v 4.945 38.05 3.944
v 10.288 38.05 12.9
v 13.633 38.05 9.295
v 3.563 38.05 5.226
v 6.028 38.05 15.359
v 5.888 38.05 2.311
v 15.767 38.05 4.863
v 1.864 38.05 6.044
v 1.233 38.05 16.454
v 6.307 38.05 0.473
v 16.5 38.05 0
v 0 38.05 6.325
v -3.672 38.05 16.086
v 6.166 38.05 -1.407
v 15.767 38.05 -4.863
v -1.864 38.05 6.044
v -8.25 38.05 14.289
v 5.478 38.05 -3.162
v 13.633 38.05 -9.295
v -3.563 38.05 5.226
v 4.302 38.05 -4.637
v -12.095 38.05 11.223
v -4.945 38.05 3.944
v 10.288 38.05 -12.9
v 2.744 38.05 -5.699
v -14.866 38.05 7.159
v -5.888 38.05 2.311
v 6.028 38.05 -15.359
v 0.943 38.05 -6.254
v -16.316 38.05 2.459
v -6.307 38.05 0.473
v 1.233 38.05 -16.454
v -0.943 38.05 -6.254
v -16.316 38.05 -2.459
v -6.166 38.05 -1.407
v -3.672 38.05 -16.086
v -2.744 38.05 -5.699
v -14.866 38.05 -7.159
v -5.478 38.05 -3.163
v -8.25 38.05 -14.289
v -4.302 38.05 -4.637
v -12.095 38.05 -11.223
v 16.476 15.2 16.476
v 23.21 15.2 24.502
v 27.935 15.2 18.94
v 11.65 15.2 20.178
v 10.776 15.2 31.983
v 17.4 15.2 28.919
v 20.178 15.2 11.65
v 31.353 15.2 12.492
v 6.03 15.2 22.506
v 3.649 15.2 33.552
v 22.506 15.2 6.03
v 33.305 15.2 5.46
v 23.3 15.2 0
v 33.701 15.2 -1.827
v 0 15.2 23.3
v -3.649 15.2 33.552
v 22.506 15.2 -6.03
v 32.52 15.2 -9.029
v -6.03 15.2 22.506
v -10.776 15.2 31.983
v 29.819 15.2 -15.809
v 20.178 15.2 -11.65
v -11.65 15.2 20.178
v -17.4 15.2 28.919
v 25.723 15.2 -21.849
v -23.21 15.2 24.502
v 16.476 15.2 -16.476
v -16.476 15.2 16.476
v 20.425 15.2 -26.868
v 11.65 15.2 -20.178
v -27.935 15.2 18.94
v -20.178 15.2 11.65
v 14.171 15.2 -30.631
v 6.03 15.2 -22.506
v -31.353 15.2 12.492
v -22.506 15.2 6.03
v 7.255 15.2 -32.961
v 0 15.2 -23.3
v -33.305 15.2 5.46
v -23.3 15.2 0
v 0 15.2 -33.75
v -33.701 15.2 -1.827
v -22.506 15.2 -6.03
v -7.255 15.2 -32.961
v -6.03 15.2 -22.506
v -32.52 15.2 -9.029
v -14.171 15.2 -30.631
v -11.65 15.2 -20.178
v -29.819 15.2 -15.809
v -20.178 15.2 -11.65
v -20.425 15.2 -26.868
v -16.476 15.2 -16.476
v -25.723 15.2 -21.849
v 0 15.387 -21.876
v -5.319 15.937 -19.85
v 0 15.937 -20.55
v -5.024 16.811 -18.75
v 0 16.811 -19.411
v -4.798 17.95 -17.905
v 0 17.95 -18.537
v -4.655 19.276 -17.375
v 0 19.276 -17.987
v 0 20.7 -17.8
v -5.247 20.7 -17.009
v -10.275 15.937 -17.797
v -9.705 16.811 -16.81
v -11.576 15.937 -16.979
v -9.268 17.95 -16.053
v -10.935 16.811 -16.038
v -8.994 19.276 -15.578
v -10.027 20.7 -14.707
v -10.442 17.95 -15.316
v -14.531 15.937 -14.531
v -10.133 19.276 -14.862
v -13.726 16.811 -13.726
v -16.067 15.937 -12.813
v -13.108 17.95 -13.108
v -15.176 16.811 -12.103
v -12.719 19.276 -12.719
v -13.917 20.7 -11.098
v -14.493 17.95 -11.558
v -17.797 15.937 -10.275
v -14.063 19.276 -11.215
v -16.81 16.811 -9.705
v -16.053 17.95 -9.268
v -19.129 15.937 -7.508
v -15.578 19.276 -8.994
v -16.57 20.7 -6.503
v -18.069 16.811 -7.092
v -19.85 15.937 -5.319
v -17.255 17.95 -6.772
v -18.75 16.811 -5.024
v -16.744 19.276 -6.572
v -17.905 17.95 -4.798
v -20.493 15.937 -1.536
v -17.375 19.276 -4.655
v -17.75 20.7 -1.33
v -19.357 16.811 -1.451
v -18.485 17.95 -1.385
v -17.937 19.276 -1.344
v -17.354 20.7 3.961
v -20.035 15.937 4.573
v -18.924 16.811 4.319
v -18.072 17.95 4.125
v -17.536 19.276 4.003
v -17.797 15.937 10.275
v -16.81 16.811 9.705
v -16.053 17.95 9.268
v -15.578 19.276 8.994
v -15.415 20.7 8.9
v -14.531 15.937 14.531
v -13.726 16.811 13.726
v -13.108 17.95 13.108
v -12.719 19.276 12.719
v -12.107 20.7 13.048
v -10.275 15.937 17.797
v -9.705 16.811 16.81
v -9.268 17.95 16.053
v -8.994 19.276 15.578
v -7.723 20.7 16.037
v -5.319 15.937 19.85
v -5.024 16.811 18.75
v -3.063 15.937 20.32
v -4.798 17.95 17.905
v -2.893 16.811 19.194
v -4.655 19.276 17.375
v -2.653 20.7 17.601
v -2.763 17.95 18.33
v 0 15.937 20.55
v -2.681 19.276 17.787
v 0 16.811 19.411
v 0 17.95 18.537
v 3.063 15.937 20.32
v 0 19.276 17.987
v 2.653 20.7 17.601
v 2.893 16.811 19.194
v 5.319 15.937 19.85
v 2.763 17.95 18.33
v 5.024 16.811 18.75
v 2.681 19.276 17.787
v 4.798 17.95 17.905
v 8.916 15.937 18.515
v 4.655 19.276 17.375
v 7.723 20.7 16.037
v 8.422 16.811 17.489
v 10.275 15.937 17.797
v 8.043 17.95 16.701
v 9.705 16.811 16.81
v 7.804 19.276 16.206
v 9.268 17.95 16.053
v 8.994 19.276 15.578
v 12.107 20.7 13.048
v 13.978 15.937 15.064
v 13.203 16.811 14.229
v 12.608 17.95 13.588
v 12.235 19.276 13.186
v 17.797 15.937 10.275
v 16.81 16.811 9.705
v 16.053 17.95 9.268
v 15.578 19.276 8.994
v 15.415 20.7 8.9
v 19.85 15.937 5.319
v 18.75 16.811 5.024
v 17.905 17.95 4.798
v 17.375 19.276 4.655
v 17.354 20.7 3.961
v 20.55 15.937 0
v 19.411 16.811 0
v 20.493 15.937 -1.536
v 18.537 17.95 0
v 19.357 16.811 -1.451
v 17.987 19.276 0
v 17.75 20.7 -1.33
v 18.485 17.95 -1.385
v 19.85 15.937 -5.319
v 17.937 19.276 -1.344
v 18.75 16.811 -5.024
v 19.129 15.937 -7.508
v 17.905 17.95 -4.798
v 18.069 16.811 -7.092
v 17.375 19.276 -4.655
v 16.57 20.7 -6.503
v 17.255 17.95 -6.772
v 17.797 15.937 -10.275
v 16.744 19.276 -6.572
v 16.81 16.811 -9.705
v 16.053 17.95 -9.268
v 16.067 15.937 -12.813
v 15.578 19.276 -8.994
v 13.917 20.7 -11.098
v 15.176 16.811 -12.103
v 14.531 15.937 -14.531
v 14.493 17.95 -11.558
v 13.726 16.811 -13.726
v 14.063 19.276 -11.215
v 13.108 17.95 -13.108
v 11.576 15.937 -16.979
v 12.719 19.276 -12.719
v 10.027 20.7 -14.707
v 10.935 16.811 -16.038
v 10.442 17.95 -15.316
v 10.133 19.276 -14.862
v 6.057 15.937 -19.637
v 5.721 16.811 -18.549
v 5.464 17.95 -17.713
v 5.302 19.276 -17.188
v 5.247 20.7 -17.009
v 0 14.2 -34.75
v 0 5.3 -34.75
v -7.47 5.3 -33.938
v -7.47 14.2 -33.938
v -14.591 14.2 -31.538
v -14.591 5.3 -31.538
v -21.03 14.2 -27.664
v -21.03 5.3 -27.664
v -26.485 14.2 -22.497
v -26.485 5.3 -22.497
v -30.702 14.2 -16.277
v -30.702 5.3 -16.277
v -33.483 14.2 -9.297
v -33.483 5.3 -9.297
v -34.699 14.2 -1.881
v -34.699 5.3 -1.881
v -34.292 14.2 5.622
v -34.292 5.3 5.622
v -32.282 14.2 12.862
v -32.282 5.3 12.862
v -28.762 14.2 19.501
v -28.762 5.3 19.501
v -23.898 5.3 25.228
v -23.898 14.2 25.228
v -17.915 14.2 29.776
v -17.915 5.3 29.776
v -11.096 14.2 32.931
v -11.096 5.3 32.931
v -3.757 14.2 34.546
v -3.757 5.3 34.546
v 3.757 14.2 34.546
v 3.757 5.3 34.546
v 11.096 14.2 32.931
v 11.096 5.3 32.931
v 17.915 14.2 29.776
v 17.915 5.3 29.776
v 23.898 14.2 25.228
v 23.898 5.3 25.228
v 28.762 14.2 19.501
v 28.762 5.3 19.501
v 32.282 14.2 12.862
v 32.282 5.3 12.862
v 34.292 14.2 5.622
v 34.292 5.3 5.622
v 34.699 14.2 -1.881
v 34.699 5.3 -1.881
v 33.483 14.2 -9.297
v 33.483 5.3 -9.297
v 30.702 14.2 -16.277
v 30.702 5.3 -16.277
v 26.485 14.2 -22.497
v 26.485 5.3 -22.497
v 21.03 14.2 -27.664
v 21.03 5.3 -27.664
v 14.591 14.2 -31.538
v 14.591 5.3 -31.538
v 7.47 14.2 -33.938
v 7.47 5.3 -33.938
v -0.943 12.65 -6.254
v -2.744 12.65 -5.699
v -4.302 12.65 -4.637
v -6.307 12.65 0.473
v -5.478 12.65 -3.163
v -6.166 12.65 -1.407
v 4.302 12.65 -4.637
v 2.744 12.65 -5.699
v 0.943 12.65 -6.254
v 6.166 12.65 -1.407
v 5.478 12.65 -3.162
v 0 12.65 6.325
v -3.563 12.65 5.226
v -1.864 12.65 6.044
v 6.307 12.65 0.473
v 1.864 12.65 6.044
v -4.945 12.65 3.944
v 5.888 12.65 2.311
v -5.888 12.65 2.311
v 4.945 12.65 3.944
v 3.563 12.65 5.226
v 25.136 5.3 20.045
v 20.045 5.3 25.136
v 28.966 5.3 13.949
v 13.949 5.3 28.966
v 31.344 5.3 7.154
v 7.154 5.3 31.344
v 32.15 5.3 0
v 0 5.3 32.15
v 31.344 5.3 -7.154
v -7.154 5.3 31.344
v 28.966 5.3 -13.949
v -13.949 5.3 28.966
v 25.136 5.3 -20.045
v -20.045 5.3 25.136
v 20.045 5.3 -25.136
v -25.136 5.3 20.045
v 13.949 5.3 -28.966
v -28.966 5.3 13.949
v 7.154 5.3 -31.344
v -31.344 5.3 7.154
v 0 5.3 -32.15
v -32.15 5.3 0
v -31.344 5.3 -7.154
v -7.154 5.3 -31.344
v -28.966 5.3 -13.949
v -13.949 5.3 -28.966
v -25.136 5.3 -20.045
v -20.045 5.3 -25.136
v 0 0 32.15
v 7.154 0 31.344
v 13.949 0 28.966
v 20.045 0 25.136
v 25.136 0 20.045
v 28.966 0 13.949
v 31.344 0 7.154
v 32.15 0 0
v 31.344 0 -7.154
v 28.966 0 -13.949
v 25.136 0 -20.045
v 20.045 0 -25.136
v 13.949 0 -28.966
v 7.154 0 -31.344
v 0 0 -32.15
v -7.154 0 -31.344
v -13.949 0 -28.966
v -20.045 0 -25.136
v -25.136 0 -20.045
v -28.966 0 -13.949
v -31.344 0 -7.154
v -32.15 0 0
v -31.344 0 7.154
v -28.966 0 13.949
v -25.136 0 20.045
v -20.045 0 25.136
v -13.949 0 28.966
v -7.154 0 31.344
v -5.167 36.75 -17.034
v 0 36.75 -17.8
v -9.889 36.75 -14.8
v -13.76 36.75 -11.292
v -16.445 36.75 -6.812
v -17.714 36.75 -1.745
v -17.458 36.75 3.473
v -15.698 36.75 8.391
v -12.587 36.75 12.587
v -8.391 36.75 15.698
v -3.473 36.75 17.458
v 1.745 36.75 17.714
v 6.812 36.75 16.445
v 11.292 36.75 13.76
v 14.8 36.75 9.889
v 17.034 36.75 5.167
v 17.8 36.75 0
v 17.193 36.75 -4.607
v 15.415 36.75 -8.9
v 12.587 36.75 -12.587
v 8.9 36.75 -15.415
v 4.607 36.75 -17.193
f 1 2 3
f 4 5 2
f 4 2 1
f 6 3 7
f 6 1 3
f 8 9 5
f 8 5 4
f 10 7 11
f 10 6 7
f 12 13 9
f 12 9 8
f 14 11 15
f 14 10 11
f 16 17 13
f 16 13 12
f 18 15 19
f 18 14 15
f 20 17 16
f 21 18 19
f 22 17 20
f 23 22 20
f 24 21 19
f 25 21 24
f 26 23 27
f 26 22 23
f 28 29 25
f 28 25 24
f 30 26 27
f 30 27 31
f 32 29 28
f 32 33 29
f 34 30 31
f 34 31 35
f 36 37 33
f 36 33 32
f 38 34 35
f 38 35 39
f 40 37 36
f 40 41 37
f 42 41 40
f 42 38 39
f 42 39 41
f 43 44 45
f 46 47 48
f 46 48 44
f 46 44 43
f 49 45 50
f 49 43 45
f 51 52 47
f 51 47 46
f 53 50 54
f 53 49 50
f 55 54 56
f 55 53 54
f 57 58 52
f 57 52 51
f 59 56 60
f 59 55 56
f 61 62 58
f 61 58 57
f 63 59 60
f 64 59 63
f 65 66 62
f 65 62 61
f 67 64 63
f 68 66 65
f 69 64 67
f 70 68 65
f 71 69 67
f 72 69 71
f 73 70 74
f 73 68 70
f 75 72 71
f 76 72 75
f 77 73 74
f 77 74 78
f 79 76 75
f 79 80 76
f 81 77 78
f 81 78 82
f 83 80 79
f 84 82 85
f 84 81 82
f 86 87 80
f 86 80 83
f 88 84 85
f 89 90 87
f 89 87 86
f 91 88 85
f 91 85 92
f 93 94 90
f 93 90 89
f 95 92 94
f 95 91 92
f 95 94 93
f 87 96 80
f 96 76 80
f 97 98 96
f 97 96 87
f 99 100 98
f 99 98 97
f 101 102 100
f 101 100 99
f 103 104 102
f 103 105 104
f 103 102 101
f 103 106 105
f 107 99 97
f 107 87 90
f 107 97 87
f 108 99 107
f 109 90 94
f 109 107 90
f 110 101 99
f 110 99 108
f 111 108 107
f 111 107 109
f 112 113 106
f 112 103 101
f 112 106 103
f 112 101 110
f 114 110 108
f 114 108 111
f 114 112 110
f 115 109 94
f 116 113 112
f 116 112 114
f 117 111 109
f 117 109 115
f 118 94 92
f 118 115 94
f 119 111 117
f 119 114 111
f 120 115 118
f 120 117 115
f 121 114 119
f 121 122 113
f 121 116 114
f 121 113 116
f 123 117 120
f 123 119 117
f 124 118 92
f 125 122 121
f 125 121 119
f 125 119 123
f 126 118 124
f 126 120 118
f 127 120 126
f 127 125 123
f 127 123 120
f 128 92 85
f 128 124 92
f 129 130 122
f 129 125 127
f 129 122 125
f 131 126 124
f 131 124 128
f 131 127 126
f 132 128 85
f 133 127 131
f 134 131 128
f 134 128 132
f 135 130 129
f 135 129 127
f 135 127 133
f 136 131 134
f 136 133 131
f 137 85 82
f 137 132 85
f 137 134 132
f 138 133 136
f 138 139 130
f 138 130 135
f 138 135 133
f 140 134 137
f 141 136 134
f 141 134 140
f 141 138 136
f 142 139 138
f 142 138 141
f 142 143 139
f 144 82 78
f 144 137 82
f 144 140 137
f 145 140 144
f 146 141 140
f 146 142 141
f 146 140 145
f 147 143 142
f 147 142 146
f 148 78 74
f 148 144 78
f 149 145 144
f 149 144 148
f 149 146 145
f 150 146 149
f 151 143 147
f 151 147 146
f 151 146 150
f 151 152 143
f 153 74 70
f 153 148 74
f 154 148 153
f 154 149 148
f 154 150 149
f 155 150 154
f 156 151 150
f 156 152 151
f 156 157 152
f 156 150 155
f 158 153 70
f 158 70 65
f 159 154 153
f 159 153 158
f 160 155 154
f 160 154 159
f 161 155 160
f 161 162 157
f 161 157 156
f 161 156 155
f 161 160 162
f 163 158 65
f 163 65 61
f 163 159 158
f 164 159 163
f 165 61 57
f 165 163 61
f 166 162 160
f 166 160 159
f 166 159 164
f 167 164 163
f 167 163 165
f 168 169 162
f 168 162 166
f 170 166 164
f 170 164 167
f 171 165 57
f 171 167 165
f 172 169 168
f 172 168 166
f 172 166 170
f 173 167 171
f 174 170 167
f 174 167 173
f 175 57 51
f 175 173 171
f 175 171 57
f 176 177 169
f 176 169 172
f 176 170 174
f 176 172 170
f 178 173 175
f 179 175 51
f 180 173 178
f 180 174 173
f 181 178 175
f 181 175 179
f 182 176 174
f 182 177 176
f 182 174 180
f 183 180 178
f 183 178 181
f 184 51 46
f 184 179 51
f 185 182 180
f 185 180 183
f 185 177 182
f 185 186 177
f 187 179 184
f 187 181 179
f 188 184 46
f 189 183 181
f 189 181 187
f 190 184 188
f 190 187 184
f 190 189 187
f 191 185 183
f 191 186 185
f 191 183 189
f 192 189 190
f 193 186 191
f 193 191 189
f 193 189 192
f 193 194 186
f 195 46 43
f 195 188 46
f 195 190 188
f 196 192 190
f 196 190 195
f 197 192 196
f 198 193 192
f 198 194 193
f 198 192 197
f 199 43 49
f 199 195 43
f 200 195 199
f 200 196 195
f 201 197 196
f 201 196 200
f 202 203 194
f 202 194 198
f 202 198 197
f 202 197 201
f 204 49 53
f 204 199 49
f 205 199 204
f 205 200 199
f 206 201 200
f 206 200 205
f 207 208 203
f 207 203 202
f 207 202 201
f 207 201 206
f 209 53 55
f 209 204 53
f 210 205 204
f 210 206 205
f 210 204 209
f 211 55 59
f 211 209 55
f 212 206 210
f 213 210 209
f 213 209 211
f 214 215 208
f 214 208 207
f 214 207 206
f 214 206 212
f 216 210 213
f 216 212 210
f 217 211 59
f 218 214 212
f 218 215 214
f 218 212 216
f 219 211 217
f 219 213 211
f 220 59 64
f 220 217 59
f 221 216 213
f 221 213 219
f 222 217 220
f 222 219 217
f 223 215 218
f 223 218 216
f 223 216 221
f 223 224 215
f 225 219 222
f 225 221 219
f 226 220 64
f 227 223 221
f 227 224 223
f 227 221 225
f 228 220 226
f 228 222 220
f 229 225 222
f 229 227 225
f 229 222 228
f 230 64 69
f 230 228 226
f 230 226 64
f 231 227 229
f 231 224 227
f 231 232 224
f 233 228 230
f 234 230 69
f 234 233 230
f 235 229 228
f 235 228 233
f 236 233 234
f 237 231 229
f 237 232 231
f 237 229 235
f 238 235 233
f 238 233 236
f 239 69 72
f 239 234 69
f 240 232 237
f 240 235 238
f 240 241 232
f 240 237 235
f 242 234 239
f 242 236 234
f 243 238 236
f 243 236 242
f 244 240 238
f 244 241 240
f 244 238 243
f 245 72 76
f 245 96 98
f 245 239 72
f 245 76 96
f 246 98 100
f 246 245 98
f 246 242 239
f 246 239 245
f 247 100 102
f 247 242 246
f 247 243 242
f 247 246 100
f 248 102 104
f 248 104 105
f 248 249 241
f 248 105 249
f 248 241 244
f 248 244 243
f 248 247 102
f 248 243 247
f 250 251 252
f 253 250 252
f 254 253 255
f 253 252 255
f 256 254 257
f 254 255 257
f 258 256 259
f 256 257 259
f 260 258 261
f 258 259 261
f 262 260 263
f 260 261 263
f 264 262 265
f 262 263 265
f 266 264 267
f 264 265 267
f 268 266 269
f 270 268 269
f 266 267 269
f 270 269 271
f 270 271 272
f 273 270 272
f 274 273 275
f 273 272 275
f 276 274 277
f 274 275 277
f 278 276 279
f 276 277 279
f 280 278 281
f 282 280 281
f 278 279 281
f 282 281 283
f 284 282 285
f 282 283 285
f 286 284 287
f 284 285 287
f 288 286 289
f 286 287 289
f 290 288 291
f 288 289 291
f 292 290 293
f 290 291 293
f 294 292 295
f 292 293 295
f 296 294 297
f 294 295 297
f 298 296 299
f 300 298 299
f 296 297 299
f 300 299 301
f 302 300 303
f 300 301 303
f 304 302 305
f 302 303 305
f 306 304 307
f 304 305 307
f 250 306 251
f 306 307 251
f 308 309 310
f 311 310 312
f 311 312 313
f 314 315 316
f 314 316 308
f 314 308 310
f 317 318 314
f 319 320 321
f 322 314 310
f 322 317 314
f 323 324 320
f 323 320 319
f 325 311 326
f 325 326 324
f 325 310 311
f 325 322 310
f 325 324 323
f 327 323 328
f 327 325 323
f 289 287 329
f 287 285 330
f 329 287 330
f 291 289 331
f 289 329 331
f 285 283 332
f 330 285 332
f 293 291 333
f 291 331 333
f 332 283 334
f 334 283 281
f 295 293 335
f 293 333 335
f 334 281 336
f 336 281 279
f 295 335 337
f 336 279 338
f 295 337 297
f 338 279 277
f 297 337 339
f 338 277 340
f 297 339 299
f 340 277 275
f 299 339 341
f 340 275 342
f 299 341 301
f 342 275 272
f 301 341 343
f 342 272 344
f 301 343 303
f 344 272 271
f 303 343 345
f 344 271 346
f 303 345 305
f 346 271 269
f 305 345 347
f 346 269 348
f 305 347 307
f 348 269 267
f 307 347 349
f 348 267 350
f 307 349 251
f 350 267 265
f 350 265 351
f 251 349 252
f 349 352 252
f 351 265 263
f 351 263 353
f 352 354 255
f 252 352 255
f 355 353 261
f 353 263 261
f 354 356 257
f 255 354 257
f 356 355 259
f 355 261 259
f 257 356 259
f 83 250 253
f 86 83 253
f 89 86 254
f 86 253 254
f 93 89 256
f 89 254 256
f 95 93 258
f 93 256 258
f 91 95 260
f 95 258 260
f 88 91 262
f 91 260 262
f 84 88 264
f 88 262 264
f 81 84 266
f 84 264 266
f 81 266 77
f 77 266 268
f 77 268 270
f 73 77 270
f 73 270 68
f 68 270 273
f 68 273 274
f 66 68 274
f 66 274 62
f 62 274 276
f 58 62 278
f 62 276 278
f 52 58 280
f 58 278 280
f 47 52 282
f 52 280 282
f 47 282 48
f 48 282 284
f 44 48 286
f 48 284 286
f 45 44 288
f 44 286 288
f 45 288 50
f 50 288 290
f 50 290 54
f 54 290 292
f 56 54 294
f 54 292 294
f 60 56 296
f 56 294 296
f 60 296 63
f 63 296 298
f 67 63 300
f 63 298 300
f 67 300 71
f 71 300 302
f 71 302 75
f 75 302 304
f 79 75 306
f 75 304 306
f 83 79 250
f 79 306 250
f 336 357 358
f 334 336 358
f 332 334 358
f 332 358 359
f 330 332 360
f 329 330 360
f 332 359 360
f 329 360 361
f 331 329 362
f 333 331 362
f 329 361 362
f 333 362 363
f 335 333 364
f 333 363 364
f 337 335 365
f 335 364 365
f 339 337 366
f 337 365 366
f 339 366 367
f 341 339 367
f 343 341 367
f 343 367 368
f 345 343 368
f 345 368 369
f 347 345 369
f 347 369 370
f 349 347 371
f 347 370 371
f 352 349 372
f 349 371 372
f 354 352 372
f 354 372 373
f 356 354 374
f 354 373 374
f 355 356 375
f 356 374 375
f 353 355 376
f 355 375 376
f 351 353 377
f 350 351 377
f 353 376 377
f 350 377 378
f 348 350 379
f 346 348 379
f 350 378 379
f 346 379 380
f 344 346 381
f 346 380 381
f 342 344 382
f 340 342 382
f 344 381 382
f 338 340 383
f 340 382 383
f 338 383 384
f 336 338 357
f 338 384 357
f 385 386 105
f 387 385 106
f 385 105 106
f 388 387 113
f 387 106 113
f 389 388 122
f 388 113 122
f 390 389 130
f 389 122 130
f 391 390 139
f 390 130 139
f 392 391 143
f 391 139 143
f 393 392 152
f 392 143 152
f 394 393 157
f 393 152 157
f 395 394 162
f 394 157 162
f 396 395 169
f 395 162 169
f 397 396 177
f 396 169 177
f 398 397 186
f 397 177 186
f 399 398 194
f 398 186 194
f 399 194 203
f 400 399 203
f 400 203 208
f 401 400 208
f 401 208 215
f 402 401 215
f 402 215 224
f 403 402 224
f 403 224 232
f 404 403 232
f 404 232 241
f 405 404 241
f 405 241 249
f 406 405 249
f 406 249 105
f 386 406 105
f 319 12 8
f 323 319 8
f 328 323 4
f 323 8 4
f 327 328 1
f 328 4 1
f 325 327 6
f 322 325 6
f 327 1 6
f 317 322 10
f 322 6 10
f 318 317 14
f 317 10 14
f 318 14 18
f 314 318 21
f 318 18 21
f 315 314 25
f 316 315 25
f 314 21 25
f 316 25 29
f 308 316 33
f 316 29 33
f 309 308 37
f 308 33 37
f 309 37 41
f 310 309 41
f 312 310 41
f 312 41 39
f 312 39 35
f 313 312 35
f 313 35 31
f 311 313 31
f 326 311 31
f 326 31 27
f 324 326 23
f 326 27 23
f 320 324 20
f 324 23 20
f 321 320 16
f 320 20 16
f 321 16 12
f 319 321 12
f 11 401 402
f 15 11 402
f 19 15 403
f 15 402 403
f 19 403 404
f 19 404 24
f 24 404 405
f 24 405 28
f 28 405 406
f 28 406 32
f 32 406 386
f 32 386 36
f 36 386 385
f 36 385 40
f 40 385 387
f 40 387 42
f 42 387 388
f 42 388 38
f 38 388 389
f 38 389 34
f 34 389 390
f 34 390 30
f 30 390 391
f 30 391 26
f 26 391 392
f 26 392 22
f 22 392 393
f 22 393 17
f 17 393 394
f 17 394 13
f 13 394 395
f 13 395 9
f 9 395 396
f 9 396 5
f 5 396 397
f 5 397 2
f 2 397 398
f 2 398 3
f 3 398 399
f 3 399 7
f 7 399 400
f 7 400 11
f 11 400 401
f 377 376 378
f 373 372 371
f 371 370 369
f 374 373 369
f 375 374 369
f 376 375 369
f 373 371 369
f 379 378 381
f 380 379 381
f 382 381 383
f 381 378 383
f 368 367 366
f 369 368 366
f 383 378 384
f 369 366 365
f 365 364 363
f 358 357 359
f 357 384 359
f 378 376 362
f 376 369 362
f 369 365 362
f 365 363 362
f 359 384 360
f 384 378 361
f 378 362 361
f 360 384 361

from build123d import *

# Parameters (mm, degrees)
SKETCH1_R           = 32.15
BOSS_EXTRUDE1_DEPTH = 5.3
SKETCH2_R           = 34.75
BOSS_EXTRUDE2_DEPTH = 9.9
SKETCH3_R           = 17.8
BOSS_EXTRUDE3_DEPTH = 22.85
SKETCH4_R           = 6.325
CUT_EXTRUDE1_DEPTH  = 25.4
FILLET1_R           = 5.5
CHAMFER2_SIZE       = 1


with BuildPart() as part:
    # Sketch1 → Boss-Extrude1 (new body)
    with BuildSketch(Plane(origin=(0, 0, 0), x_dir=(1, 0, 0), z_dir=(0, 1, 0))):
        with Locations(Location((0, 0, 0), (0, 0, 270))):
            Circle(SKETCH1_R)
    extrude(amount=BOSS_EXTRUDE1_DEPTH)

    # Sketch2 → Boss-Extrude2 (add)
    with BuildSketch(Plane(origin=(0, 5.3, 0), x_dir=(1, 0, 0), z_dir=(0, 1, 0))):
        with Locations(Location((0, 0, 0), (0, 0, 90))):
            Circle(SKETCH2_R)
    extrude(amount=BOSS_EXTRUDE2_DEPTH)

    # Sketch3 → Boss-Extrude3 (add)
    with BuildSketch(Plane(origin=(0, 15.2, 0), x_dir=(1, 0, 0), z_dir=(0, 1, 0))):
        with Locations(Location((0, 0, 0), (0, 0, 90))):
            Circle(SKETCH3_R)
    extrude(amount=BOSS_EXTRUDE3_DEPTH)

    # Sketch4 → Cut-Extrude1 (cut)
    with BuildSketch(Plane(origin=(0, 38.05, 0), x_dir=(1, 0, 0), z_dir=(0, 1, 0))):
        with Locations(Location((0, 0, 0), (0, 0, 270))):
            Circle(SKETCH4_R)
    extrude(amount=-CUT_EXTRUDE1_DEPTH, mode=Mode.SUBTRACT)

    # Fillet1
    fillet1_edges = [part.edges().sort_by_distance(p)[0] for p in [
        (0, 15.2, 17.8),
    ]]
    fillet(fillet1_edges, radius=FILLET1_R)

    # Chamfer1: read off the stored shape, not the designer's step
    # Chamfer1 outline → Chamfer1 (revolve, cut)
    with BuildSketch(Plane.XY):
        Polygon((17.8, 38.05), (16.5, 38.05), (17.8, 36.75), align=None)
    revolve(axis=Axis((0, 0, 0), (0, 1, 0)), mode=Mode.SUBTRACT)

    # Chamfer2
    chamfer2_edges = [part.edges().sort_by_distance(p)[0] for p in [
        (0, 15.2, 34.75),
    ]]
    chamfer(chamfer2_edges, length=CHAMFER2_SIZE)


solid = part.part
